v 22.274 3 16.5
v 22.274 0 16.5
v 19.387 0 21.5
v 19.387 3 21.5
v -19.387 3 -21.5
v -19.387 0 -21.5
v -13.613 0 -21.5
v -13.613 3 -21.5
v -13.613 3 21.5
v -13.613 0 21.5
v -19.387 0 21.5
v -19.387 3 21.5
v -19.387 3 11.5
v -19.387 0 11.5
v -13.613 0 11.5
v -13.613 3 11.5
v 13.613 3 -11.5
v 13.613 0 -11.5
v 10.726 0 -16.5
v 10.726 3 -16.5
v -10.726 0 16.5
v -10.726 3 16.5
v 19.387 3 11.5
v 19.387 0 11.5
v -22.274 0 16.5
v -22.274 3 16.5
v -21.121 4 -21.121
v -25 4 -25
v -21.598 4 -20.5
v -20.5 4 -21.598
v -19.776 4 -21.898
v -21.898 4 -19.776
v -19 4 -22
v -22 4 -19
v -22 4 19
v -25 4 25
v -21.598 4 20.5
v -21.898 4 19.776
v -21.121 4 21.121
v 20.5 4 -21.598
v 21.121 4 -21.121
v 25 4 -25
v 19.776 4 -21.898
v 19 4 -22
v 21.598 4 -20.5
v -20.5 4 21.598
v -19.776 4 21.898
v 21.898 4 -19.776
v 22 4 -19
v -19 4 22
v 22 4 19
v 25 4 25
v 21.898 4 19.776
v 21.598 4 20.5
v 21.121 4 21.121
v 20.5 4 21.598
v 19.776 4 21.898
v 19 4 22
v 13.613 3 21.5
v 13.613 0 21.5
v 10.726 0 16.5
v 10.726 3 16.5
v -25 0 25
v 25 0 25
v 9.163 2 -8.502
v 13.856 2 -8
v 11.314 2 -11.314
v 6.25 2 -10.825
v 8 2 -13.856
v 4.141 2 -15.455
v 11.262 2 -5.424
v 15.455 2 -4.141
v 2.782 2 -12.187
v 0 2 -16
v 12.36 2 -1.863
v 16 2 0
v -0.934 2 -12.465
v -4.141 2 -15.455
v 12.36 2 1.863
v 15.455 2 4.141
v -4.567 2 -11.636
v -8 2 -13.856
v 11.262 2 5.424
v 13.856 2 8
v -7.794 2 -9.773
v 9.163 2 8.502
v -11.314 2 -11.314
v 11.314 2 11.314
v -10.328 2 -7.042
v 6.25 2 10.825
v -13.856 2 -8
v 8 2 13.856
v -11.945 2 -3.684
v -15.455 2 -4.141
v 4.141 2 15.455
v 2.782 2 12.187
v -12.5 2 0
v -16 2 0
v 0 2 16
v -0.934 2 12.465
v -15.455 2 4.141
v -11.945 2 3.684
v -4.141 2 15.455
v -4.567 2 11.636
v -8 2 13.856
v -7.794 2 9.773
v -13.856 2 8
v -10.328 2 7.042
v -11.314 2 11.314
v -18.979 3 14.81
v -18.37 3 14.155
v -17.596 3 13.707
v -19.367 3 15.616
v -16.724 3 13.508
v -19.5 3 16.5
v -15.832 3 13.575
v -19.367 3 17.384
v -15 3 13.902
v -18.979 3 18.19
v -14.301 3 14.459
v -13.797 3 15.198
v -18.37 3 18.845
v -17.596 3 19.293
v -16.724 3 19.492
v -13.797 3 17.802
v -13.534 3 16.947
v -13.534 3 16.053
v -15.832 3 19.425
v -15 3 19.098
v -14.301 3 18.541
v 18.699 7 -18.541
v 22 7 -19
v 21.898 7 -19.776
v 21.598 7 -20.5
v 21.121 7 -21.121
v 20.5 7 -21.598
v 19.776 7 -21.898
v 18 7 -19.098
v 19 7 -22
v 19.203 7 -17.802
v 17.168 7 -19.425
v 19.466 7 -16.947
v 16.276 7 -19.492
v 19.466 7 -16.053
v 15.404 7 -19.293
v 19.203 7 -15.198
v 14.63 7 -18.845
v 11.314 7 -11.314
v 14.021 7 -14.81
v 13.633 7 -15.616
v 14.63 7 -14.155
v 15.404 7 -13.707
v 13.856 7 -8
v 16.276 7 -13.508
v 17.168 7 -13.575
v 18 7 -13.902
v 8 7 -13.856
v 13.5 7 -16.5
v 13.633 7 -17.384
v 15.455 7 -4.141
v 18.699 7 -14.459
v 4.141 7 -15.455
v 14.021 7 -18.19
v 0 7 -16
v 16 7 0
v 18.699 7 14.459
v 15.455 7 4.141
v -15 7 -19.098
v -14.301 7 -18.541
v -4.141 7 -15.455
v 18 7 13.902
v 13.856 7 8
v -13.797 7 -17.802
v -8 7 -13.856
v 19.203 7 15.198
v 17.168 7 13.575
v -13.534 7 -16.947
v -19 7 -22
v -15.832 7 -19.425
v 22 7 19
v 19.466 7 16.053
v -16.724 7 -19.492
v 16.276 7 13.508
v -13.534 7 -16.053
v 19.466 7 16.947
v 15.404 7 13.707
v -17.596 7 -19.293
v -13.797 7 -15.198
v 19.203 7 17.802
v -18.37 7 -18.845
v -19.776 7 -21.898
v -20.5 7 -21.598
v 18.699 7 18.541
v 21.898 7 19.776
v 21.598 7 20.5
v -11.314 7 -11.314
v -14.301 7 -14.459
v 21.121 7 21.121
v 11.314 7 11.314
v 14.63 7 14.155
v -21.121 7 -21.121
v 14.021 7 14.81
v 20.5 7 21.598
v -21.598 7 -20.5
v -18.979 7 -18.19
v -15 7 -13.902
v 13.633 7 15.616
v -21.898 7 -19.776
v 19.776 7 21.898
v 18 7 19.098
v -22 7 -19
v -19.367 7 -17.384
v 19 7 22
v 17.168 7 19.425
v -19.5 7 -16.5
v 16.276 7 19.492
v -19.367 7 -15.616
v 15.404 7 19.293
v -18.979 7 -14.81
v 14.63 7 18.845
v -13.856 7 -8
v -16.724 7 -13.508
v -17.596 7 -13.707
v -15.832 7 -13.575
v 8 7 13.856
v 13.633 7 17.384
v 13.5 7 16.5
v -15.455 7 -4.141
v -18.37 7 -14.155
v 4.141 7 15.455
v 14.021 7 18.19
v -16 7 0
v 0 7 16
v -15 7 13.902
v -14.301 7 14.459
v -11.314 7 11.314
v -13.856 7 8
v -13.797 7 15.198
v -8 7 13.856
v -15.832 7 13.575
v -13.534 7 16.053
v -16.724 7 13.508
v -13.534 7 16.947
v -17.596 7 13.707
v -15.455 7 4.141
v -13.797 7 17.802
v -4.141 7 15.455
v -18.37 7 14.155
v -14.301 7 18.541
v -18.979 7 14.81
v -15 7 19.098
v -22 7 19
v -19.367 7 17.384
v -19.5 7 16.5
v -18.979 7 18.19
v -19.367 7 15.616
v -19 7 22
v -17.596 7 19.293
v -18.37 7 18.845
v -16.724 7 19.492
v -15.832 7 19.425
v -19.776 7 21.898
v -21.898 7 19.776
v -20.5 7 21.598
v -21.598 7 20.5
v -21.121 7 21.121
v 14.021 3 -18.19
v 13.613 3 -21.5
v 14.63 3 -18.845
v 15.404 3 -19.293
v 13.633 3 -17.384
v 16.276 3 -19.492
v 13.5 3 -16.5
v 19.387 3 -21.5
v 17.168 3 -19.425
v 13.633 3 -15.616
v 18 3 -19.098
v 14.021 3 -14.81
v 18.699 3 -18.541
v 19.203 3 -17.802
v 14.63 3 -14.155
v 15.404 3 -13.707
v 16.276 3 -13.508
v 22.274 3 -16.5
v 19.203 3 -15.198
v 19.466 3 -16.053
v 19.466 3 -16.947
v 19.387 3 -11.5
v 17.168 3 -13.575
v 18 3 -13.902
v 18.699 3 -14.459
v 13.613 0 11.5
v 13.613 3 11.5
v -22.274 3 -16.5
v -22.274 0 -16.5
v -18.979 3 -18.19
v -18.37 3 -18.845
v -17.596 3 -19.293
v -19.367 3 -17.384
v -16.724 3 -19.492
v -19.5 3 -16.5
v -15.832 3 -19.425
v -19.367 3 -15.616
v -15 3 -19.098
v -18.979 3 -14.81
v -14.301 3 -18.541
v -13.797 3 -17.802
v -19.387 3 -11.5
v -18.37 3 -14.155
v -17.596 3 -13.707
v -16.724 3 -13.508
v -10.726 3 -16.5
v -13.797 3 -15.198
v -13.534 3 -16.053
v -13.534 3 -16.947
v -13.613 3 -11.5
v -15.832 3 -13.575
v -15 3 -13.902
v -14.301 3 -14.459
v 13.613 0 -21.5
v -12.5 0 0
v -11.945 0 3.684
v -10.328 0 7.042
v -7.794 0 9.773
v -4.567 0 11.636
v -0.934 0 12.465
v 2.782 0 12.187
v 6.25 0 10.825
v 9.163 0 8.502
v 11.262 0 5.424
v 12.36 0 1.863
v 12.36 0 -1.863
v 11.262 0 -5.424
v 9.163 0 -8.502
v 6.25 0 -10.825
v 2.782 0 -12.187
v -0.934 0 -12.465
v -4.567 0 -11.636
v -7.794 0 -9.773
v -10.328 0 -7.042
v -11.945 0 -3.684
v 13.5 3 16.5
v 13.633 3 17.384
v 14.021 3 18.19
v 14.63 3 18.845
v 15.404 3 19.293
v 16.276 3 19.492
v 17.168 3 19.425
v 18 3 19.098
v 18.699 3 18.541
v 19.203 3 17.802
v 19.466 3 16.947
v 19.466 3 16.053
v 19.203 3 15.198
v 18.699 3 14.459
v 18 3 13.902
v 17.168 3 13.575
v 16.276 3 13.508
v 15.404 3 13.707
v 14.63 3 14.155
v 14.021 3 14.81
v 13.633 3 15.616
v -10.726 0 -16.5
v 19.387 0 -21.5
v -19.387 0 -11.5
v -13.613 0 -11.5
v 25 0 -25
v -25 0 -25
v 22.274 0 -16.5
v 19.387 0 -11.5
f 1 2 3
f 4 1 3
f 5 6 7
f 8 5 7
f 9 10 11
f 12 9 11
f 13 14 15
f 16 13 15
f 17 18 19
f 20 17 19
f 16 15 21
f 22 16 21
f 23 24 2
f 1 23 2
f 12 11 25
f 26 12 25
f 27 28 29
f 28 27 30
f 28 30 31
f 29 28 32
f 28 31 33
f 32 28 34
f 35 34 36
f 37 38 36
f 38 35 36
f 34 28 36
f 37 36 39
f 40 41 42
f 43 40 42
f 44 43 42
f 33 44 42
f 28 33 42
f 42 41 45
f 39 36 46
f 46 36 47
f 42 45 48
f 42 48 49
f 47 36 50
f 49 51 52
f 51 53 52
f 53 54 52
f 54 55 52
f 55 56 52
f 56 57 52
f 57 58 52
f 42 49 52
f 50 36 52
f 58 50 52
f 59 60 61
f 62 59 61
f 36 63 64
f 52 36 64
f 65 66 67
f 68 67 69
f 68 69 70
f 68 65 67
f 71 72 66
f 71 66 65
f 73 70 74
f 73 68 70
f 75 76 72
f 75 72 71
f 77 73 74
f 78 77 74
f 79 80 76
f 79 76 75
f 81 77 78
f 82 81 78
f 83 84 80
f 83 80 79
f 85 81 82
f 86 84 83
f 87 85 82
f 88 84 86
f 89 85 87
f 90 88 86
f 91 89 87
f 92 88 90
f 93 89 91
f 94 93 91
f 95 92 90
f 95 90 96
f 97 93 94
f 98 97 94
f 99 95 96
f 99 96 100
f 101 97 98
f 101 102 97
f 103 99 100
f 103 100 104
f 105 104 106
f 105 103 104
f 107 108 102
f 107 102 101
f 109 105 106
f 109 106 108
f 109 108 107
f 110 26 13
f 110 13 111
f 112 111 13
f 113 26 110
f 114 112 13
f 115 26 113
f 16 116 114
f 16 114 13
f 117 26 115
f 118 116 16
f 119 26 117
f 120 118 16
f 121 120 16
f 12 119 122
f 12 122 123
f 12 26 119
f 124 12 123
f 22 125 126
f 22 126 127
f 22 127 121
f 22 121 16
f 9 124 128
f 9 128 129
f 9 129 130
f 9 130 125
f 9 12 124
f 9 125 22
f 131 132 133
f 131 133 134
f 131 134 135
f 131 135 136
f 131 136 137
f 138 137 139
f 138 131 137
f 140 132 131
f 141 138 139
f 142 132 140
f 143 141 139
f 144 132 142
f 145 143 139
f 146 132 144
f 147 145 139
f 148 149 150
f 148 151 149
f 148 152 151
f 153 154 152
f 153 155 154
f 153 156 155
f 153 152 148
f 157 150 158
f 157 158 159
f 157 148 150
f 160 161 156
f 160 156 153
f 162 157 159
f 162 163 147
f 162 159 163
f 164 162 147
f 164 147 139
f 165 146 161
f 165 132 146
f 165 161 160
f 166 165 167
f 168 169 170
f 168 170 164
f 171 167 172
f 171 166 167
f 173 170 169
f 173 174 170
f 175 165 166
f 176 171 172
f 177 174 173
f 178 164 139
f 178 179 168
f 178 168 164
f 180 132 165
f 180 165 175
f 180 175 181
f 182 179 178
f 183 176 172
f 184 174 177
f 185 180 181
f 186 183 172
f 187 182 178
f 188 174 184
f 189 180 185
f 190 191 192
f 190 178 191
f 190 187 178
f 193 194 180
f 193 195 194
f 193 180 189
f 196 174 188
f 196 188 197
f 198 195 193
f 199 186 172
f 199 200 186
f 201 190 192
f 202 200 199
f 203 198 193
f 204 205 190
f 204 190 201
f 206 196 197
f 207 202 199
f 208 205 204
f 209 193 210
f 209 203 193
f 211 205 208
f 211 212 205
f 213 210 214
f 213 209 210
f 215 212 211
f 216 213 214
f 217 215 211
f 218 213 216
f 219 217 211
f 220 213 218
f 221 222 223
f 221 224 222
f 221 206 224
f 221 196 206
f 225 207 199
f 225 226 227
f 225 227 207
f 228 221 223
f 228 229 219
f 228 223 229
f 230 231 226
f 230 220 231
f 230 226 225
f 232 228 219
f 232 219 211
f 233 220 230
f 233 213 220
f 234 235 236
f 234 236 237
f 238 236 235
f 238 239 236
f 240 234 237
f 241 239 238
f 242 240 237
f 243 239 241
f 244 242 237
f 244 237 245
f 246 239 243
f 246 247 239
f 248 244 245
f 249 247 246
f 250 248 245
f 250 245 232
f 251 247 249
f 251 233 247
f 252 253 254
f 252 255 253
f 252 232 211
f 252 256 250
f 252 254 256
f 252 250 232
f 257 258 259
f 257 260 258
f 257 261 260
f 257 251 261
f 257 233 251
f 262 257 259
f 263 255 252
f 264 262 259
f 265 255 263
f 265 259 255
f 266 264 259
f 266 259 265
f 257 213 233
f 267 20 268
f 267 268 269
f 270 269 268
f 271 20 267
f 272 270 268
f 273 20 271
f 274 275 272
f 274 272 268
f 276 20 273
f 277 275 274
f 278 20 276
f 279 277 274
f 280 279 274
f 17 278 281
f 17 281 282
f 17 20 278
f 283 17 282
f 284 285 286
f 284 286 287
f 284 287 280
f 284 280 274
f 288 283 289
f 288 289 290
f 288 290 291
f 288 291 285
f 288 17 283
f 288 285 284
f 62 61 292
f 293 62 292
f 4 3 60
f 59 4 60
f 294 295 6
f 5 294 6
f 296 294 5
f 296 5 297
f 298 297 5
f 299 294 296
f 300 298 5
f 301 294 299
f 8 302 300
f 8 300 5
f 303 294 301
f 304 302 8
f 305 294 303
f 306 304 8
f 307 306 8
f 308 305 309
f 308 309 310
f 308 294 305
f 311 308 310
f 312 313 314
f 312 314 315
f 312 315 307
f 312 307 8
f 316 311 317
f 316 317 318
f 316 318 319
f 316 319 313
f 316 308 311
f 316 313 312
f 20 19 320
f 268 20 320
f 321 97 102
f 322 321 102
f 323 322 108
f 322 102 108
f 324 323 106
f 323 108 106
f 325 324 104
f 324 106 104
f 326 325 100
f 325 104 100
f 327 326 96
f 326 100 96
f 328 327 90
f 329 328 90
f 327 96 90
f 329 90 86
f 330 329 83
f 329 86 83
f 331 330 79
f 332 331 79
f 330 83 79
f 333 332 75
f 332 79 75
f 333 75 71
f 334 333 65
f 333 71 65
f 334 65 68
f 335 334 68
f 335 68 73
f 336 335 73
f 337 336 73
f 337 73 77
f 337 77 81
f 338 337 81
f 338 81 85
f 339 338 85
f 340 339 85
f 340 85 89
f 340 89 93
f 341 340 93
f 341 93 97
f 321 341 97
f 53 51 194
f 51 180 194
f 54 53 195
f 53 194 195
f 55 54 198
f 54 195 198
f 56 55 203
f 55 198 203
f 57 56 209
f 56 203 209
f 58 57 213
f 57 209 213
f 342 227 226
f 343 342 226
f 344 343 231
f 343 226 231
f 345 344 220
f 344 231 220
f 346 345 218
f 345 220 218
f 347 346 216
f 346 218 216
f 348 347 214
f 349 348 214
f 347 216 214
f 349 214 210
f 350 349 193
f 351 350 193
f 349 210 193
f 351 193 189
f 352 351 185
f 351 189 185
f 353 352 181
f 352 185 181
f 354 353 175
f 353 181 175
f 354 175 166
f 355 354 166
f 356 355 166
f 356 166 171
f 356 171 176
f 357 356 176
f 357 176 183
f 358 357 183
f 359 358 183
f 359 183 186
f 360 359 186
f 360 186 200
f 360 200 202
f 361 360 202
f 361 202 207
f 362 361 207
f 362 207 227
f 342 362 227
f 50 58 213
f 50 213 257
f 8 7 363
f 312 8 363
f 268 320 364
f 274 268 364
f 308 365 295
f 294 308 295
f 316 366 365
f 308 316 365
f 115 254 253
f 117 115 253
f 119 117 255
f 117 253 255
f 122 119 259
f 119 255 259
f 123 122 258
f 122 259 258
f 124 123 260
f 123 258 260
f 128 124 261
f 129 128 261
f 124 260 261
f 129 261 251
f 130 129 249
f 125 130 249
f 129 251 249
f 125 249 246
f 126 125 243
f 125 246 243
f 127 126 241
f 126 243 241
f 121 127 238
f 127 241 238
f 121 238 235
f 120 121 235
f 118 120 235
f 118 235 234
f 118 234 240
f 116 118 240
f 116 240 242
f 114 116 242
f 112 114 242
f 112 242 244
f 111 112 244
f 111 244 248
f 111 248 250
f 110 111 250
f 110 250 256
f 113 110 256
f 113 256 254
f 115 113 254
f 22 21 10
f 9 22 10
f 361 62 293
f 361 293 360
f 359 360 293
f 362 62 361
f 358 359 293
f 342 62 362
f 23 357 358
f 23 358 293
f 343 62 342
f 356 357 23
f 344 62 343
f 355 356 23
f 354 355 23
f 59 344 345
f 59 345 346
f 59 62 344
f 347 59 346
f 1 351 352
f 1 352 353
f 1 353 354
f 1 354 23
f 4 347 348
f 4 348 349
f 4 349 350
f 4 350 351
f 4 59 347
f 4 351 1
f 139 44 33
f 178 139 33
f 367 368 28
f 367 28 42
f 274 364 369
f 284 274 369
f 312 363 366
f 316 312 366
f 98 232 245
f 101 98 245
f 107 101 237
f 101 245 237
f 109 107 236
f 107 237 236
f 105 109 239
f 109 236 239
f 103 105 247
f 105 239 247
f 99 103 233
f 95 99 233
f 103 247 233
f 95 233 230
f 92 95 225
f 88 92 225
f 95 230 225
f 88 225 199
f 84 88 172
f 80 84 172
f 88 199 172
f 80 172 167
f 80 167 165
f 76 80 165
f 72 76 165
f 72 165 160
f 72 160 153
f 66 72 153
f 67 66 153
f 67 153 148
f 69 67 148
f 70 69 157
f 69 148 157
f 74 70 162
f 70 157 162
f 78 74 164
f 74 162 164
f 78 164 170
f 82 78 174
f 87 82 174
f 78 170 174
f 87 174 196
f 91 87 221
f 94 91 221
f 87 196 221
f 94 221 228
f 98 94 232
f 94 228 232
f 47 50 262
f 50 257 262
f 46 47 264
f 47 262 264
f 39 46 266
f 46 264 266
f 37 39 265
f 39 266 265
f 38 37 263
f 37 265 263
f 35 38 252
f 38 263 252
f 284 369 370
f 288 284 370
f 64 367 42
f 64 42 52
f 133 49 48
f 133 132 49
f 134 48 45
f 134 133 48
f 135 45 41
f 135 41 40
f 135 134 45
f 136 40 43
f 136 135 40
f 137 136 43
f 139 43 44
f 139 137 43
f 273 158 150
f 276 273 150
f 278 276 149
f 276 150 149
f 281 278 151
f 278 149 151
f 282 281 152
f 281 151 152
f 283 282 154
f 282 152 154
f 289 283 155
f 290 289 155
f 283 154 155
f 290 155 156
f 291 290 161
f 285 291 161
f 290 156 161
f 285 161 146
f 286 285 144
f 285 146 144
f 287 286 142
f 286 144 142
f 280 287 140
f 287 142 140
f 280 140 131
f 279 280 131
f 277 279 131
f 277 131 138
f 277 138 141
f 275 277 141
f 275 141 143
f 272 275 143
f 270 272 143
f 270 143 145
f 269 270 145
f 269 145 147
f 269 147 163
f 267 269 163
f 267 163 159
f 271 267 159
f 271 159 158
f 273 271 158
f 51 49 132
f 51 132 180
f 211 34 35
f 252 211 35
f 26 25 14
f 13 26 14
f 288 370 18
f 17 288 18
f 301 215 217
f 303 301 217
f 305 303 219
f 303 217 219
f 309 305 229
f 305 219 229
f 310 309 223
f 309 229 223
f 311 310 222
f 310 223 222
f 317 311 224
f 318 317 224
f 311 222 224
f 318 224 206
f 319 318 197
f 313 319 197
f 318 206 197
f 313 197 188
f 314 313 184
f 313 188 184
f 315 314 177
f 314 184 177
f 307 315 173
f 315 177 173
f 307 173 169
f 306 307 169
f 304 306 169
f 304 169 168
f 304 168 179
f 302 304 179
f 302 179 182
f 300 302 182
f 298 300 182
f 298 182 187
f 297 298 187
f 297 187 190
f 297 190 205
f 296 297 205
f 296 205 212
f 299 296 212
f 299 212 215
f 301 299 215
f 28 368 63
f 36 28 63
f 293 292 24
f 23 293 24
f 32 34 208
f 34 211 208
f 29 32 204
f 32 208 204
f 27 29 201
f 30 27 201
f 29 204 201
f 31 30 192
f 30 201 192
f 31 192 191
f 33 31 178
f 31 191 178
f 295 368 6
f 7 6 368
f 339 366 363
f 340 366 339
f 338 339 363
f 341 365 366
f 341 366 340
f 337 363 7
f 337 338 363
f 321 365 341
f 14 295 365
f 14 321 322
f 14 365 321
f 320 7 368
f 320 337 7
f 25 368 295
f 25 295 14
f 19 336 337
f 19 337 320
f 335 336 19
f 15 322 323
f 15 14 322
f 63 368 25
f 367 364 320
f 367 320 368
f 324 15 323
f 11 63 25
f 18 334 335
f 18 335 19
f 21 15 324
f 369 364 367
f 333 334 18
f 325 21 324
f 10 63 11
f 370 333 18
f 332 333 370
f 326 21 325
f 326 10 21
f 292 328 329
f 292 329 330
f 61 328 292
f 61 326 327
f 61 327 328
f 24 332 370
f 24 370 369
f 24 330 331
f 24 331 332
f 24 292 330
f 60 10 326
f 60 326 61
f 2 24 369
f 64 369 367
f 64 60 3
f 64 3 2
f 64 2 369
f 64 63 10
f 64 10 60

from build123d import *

# Parameters (mm, degrees)
F0_W      = 50
F0_H      = 50
F1_DEPTH  = 4
F2_W      = 44
F2_H      = 44
F3_DEPTH  = 3
F4_R      = 3
F4_R_2    = 7.5
F5_DEPTH  = 25
F7_DEPTH  = 3
F8_R      = 12
F9_DEPTH  = 5
F10_R     = 16
F11_DEPTH = 5
F12_R     = 12.5
F13_DEPTH = 2.001
F14_R     = 3


with BuildPart() as f1:
    # F0 (on Front) → F1 (new body)
    with BuildSketch(Plane.XZ):
        Rectangle(F0_W, F0_H)
    extrude(amount=-F1_DEPTH)

    # F2 (on face) → F3 (join)
    with BuildSketch(Plane(origin=(0, 4, 0), x_dir=(-1, 0, 0), z_dir=(0, 1, 0))):
        Rectangle(F2_W, F2_H)
    extrude(amount=F3_DEPTH)

    # F4 (on face) → F5 (cut)
    with BuildSketch(Plane(origin=(0, 7, 0), x_dir=(-1, 0, 0), z_dir=(0, 1, 0))):
        with Locations((-16.5, 16.5)):
            Circle(F4_R)
        with Locations((16.5, 16.5)):
            Circle(F4_R)
        with Locations((16.5, -16.5)):
            Circle(F4_R)
        with Locations((-16.5, -16.5)):
            Circle(F4_R)
        Circle(F4_R_2)
    extrude(amount=-F5_DEPTH, mode=Mode.SUBTRACT)

    # F6 (on face) → F7 (cut)
    with BuildSketch(Plane.XZ):
        Polygon((-19.386751, 11.5), (-13.613249, 11.5), (-10.726497, 16.5), (-13.613249, 21.5), (-19.386751, 21.5), (-22.273503, 16.5), align=None)
        Polygon((19.386751, 21.5), (13.613249, 21.5), (10.726497, 16.5), (13.613249, 11.5), (19.386751, 11.5), (22.273503, 16.5), align=None)
        Polygon((13.613249, -21.5), (19.386751, -21.5), (22.273503, -16.5), (19.386751, -11.5), (13.613249, -11.5), (10.726497, -16.5), align=None)
        Polygon((-19.386751, -21.5), (-13.613249, -21.5), (-10.726497, -16.5), (-13.613249, -11.5), (-19.386751, -11.5), (-22.273503, -16.5), align=None)
    extrude(amount=-F7_DEPTH, mode=Mode.SUBTRACT)

    # F8 (on face) → F9 (cut)
    with BuildSketch(Plane(origin=(0, 7, 0), x_dir=(-1, 0, 0), z_dir=(0, 1, 0))):
        Circle(F8_R)
    extrude(amount=-F9_DEPTH, mode=Mode.SUBTRACT)

    # F10 (on face) → F11 (cut)
    with BuildSketch(Plane(origin=(0, 7, 0), x_dir=(-1, 0, 0), z_dir=(0, 1, 0))):
        Circle(F10_R)
    extrude(amount=-F11_DEPTH, mode=Mode.SUBTRACT)

    # F12 (on face) → F13 (cut, through all)
    with BuildSketch(Plane(origin=(0, 2, 0), x_dir=(-1, 0, 0), z_dir=(0, 1, 0))):
        Circle(F12_R)
    extrude(amount=-F13_DEPTH, mode=Mode.SUBTRACT)

    # F14
    f14_edges = [f1.edges().sort_by_distance(p)[0] for p in [
        (22, 5.5, 22),
        (-22, 5.5, 22),
        (-22, 5.5, -22),
        (22, 5.5, -22),
    ]]
    fillet(f14_edges, radius=F14_R)


solid = f1.part
